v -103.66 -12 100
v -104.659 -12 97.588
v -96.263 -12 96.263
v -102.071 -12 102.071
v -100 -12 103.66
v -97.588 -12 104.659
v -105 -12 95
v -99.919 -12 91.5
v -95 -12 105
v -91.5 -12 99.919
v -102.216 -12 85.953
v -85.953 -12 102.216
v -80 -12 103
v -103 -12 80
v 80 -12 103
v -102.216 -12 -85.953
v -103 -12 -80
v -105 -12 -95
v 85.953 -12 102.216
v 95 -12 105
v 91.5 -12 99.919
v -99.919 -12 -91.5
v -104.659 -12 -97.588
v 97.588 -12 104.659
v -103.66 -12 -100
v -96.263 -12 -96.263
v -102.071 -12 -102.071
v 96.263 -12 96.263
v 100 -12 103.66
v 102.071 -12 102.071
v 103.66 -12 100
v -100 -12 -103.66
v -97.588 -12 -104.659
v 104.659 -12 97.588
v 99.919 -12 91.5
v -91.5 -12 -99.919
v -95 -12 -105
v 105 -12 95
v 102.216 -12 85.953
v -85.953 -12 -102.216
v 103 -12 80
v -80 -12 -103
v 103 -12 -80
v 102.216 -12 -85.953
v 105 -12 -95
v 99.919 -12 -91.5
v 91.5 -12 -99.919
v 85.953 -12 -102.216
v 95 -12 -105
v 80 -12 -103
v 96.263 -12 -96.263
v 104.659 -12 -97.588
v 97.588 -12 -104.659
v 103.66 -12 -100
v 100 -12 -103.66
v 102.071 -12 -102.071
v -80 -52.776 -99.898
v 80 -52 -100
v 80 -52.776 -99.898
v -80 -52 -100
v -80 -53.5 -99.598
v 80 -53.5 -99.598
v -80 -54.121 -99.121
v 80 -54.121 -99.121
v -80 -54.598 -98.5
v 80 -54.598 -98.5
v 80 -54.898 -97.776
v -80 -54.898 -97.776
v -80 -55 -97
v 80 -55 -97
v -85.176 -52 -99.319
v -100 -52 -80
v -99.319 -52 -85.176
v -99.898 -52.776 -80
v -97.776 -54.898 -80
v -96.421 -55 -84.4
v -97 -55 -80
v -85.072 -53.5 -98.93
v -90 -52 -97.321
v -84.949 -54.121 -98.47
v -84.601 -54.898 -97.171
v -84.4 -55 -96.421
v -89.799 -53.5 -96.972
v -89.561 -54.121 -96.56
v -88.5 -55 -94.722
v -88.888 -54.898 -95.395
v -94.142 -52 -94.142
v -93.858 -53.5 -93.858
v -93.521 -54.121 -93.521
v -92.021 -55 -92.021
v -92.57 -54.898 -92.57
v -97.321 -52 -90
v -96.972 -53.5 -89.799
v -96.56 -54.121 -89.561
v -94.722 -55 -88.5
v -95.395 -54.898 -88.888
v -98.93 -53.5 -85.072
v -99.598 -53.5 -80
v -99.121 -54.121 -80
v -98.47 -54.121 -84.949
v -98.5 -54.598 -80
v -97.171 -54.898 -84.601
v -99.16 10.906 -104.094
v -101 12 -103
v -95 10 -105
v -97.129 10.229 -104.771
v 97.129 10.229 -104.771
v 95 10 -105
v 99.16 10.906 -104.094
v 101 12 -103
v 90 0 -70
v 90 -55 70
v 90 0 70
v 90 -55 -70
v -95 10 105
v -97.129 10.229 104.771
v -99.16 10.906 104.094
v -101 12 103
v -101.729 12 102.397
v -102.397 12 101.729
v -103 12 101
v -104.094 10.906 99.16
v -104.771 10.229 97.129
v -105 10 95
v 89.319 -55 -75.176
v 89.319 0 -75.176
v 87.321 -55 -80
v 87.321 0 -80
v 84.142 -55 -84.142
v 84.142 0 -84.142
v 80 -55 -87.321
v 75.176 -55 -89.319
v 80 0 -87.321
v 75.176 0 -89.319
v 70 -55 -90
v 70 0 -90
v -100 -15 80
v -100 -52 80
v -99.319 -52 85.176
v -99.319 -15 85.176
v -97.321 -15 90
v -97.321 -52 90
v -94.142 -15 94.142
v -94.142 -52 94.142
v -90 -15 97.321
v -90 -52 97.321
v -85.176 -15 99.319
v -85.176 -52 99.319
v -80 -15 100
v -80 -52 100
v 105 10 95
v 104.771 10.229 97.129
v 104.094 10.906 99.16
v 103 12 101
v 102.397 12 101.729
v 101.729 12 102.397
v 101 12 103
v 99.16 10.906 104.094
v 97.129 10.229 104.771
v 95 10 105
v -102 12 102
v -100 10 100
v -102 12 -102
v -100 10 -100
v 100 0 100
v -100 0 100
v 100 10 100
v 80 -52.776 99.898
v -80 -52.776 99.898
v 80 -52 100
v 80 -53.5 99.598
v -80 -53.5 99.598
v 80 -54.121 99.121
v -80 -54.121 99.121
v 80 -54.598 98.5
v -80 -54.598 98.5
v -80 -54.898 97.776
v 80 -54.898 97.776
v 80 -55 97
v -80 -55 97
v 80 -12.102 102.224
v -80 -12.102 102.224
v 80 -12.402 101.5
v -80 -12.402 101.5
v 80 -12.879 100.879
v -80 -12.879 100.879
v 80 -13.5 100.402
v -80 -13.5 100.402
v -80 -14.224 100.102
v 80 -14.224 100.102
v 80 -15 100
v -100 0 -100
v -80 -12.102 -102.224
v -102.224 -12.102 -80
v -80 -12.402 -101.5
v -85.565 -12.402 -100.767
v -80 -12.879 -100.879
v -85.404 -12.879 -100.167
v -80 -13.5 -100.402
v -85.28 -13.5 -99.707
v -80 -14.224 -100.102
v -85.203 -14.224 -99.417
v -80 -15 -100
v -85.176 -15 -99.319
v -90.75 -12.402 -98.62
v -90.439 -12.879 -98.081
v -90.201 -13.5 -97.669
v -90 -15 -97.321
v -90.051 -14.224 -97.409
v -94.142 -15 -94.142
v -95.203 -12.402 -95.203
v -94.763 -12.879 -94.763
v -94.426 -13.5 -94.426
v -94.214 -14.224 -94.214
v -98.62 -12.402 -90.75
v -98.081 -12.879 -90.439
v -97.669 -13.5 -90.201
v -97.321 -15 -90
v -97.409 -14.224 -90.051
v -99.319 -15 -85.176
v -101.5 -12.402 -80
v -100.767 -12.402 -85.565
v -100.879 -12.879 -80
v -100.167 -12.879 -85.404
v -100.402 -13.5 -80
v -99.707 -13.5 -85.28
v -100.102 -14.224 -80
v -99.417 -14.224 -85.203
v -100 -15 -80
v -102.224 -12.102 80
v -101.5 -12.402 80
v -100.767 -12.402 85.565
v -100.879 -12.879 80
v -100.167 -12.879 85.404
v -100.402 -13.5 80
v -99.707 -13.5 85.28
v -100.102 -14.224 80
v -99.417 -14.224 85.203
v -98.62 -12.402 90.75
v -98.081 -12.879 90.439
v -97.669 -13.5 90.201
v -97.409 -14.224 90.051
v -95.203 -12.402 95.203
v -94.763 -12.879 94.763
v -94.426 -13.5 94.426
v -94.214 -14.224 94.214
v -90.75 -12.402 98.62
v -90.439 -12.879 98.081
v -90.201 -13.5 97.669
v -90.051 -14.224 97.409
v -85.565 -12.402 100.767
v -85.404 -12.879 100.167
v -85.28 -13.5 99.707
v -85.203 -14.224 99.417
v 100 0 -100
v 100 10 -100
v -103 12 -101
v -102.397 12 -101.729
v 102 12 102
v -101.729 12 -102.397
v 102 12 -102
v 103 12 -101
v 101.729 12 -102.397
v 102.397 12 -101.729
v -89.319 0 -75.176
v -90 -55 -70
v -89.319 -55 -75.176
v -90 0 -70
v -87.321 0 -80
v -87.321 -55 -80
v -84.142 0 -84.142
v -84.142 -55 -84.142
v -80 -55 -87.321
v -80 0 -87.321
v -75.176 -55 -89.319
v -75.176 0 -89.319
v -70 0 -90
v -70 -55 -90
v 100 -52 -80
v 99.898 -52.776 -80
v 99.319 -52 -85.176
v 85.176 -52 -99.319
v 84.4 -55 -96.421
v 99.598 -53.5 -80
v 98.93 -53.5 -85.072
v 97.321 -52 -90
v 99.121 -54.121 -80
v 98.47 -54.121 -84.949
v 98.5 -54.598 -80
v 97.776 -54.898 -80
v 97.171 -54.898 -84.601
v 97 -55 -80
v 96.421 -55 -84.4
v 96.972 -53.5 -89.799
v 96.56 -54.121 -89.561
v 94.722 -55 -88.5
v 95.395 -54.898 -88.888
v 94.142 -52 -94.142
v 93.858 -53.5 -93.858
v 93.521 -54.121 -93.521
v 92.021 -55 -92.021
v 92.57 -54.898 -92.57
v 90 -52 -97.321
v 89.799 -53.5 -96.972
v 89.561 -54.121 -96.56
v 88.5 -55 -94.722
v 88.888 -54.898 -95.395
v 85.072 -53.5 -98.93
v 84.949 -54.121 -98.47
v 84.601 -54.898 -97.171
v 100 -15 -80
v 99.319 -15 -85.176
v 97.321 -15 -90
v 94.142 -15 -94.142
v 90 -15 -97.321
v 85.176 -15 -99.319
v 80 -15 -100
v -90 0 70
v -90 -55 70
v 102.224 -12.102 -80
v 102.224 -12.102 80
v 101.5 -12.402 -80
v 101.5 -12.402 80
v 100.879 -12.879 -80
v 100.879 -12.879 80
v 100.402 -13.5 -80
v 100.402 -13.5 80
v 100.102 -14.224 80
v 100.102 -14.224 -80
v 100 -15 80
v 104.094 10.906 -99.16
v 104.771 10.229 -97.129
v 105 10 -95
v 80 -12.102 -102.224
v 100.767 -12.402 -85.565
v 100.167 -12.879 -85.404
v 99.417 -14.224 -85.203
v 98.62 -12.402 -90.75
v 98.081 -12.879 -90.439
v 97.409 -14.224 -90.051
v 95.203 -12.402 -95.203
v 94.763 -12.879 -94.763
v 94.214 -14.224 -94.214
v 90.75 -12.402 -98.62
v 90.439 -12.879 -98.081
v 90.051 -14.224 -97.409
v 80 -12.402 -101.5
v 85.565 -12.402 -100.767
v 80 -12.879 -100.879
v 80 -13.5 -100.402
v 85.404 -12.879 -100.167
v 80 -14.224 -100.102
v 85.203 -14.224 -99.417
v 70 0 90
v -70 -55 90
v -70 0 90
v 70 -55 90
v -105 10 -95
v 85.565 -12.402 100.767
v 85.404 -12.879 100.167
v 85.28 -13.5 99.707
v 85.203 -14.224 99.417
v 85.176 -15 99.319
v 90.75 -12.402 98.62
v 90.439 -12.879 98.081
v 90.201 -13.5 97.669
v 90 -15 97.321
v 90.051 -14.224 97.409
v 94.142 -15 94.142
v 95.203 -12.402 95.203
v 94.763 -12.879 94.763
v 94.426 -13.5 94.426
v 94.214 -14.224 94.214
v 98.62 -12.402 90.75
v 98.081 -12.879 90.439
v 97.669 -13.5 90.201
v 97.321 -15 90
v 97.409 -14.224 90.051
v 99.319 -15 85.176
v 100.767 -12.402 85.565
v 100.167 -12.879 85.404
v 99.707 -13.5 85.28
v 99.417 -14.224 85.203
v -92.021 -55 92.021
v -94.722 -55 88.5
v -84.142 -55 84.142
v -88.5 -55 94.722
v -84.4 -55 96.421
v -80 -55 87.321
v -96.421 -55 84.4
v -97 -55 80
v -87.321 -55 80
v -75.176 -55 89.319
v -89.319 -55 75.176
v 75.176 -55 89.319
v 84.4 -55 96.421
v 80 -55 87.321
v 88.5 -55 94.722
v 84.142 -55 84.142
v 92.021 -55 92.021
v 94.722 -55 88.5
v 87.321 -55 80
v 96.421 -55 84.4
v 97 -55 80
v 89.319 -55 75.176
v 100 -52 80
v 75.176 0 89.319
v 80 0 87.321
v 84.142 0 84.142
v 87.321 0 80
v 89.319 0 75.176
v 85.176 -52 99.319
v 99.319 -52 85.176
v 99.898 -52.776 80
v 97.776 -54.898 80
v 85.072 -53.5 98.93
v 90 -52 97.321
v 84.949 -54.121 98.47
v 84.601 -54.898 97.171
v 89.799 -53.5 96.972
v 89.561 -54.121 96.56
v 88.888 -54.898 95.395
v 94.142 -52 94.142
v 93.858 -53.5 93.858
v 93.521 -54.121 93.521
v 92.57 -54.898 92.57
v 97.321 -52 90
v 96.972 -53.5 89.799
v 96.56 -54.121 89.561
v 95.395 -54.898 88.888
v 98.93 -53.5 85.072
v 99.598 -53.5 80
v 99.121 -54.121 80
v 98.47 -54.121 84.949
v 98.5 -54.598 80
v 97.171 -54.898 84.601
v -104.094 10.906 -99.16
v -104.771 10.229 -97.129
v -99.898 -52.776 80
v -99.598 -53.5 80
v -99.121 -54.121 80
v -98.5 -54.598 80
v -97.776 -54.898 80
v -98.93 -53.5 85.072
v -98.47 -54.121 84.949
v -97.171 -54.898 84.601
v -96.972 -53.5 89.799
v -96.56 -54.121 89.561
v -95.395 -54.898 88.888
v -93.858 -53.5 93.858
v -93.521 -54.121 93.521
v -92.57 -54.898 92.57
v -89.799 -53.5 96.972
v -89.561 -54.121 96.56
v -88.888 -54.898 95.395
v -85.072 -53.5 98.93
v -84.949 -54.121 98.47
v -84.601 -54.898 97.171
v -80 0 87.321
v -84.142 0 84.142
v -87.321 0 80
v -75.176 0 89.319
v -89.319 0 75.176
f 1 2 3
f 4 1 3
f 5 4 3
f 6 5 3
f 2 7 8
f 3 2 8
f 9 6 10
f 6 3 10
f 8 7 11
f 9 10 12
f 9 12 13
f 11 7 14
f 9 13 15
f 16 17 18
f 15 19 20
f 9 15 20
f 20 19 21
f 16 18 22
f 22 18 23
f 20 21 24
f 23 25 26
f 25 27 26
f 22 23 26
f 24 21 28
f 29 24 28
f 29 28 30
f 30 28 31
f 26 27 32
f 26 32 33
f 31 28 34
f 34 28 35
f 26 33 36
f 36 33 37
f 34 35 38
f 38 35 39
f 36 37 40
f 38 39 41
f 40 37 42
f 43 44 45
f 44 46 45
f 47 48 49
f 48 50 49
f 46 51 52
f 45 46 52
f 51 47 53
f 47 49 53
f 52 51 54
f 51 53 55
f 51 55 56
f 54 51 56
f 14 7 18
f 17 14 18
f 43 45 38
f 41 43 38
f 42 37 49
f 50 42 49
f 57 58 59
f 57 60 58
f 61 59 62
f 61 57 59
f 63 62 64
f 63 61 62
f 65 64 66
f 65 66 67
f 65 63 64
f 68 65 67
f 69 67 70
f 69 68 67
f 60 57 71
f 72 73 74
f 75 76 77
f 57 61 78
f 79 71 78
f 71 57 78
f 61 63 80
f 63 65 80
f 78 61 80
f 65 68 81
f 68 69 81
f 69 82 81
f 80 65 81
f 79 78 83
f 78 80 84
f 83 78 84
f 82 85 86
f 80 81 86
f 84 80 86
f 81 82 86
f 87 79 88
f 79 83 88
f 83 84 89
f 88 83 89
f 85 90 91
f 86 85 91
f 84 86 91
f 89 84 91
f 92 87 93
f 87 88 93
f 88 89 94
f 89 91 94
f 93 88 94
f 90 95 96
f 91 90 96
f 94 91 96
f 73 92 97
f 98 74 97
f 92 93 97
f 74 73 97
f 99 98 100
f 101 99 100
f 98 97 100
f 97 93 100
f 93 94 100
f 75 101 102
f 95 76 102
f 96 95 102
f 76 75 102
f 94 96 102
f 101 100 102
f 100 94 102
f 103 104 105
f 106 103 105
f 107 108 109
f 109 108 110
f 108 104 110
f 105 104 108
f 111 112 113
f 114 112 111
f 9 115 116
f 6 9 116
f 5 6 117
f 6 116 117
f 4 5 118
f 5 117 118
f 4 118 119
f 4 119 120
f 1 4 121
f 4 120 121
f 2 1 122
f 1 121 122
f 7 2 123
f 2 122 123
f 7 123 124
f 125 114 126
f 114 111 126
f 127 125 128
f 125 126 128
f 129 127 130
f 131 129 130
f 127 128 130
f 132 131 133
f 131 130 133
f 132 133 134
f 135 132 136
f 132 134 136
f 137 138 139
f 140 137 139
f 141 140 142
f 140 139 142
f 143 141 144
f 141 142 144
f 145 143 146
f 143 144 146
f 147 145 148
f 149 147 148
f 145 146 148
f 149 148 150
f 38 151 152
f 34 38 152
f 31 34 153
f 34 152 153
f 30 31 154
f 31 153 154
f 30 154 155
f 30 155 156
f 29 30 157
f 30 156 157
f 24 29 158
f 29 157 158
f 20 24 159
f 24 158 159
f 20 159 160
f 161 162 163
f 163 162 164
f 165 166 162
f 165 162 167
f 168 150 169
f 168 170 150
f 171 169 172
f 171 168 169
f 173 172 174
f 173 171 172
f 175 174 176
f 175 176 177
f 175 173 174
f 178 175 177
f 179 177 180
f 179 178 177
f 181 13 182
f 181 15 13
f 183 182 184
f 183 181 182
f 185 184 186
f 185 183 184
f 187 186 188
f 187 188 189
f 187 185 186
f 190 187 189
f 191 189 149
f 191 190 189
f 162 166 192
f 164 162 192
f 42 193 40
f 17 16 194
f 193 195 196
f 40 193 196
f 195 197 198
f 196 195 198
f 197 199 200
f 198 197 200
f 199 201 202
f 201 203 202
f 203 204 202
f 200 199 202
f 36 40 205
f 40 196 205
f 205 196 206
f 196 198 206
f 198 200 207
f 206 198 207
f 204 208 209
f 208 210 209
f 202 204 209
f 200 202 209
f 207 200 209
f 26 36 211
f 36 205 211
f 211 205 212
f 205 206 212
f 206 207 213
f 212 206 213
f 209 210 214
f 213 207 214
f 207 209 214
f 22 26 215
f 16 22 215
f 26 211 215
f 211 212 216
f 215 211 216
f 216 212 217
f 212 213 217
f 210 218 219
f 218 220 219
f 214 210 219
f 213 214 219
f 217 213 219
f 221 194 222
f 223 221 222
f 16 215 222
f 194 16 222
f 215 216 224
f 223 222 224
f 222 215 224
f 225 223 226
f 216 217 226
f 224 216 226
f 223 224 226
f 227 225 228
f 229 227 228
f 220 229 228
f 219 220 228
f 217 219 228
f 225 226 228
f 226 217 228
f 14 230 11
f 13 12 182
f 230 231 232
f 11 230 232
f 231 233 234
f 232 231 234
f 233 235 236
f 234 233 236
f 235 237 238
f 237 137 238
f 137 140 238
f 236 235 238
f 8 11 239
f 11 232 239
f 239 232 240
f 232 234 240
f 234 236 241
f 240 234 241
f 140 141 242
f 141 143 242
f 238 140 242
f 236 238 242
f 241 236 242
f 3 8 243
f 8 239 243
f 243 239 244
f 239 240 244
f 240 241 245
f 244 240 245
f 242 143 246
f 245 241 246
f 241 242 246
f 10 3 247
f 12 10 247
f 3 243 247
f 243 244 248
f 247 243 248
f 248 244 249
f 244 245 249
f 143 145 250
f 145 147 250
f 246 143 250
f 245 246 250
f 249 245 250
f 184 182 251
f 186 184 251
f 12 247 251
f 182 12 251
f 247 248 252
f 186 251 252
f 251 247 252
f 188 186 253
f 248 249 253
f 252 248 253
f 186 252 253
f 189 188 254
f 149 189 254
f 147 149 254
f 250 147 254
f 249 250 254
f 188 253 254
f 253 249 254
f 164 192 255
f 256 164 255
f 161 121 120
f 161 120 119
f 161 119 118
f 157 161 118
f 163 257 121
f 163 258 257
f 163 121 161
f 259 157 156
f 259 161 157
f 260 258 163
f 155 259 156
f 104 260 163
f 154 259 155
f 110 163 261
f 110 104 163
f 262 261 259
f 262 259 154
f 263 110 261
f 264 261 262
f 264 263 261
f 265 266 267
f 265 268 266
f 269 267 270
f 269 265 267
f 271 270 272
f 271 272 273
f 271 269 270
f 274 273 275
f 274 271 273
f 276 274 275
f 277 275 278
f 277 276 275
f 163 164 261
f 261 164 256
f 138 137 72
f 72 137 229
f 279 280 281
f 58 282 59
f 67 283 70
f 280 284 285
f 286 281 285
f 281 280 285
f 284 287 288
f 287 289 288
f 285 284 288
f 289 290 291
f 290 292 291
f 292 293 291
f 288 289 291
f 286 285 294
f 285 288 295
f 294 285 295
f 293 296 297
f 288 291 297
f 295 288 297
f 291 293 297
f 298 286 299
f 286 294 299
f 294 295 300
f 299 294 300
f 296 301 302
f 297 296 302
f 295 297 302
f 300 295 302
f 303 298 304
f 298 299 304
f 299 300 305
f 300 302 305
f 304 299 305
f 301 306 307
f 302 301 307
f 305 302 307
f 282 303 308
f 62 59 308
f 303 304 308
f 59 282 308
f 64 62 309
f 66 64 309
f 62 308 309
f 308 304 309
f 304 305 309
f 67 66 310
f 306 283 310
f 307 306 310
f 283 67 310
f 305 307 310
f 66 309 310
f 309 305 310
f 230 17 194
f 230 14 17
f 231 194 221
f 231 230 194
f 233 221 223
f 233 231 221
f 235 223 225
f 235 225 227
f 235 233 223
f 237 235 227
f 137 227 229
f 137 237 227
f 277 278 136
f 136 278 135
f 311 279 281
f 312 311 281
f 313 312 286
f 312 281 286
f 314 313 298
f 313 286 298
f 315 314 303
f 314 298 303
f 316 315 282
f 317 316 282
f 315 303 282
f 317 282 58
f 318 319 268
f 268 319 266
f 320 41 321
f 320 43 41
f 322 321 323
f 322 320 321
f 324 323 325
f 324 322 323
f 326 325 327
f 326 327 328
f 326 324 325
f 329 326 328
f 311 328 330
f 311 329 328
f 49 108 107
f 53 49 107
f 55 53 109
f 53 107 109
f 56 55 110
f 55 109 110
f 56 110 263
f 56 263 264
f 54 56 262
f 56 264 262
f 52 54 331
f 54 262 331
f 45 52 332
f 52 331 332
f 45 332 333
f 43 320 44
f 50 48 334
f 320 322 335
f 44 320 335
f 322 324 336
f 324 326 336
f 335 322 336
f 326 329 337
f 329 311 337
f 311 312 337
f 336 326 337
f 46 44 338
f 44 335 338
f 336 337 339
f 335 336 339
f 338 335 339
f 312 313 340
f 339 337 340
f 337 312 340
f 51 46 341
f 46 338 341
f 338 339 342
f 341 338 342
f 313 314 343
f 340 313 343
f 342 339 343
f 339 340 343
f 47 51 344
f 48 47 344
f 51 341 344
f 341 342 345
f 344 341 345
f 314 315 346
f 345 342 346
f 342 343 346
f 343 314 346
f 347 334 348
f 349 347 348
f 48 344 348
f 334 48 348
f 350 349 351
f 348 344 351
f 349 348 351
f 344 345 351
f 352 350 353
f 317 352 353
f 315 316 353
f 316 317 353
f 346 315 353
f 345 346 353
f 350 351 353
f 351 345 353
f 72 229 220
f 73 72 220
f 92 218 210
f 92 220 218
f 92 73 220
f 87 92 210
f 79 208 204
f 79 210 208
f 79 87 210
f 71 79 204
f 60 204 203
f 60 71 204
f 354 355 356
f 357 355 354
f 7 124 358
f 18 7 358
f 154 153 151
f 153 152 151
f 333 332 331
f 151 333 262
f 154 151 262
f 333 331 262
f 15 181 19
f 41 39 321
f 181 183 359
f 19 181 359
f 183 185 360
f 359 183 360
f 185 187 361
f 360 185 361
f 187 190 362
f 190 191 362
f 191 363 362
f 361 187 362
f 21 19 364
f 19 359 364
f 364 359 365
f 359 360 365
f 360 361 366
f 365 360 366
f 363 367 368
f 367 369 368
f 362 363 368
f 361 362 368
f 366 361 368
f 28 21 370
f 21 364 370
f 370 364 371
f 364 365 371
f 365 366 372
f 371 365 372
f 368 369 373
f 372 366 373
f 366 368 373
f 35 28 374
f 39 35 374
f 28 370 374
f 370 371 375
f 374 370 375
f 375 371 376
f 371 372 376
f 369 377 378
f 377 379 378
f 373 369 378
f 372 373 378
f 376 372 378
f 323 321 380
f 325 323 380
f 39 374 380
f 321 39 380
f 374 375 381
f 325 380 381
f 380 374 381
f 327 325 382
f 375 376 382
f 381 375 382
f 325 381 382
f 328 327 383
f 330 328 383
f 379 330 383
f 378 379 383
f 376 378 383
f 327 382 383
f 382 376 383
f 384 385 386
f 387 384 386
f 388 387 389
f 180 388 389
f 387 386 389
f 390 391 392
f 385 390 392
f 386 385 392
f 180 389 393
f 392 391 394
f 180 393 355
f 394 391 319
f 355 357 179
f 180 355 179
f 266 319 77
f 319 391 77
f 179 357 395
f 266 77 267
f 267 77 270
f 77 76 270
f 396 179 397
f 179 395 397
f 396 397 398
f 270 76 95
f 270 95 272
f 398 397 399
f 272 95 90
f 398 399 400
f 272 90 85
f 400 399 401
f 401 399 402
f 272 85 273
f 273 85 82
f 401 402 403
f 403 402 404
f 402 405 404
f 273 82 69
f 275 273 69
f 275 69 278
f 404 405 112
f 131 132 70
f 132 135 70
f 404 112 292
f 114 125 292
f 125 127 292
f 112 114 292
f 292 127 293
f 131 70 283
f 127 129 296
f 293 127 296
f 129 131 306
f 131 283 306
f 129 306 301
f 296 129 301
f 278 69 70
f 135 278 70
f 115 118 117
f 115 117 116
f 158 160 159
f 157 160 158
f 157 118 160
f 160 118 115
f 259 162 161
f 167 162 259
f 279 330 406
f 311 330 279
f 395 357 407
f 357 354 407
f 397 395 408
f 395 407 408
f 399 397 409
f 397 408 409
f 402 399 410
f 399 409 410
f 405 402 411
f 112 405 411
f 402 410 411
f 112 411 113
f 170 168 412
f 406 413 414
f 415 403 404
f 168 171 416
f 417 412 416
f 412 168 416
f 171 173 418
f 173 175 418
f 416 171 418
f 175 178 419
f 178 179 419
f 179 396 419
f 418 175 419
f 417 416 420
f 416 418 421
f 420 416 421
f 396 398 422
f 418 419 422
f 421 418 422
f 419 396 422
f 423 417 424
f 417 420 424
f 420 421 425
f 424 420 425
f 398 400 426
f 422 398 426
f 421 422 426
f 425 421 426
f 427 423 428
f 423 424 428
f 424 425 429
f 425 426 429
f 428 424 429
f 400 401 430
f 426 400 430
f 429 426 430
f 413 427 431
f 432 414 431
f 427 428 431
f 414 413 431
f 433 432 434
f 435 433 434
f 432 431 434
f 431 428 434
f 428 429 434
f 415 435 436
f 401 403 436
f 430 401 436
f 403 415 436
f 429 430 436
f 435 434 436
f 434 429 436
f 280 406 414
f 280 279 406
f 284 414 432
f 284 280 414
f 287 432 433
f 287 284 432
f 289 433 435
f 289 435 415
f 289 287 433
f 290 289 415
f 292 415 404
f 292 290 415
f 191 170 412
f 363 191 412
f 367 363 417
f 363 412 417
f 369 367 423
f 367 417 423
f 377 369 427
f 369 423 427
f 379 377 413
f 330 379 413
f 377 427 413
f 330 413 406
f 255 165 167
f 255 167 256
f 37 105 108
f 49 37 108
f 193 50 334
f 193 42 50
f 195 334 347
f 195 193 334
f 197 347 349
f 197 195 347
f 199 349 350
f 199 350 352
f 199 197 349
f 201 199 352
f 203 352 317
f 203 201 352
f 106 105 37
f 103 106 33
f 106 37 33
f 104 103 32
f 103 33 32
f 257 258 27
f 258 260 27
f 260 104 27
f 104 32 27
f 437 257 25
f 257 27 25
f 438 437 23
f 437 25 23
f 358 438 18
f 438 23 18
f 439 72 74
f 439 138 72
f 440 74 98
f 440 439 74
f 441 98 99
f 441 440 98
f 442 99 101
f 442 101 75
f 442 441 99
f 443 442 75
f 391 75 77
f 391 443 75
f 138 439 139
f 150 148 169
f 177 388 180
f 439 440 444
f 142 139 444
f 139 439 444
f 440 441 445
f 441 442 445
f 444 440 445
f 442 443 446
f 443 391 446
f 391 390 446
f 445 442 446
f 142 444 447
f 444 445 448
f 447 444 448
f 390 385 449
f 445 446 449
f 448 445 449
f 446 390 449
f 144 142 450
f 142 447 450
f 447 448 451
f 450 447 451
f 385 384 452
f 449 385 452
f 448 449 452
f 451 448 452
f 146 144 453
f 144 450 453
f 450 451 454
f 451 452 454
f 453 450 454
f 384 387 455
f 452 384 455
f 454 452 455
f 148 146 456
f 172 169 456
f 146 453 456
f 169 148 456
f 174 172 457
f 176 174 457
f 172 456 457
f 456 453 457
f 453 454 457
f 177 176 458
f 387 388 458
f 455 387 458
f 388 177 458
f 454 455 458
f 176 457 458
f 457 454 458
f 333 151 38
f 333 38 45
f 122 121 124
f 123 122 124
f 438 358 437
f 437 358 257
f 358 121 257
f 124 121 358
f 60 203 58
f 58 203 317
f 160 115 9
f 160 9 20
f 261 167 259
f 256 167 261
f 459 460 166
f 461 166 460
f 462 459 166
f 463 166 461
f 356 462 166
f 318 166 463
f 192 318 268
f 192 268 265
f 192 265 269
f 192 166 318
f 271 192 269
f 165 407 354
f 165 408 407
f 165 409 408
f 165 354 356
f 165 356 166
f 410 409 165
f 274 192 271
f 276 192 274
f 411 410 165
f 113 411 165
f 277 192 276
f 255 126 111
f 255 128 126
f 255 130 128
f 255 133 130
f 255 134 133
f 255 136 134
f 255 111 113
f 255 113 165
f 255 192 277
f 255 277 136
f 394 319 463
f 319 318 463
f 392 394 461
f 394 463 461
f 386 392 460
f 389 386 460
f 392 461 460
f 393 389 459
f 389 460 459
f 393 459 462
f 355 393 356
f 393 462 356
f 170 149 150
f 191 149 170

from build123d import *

# Parameters (mm, degrees)
SKETCH1_W               = 200
SKETCH1_H               = 200
BOSS_EXTRUDE1_DEPTH     = 55
FILLET1_R               = 20
SKETCH2_W               = 210
SKETCH2_H               = 210
SKETCH2_W_2             = 200
SKETCH2_H_2             = 200
BOSS_EXTRUDE2_DEPTH     = 12
SKETCH3_W               = 210
SKETCH3_H               = 210
BOSS_EXTRUDE3_DEPTH     = 12
CUT_EXTRUDE1_DEPTH      = 159.350876221
CUT_EXTRUDE1_DEPTH_BACK = 159.350876221
SKETCH5_W               = 180
SKETCH5_H               = 180
CHAMFER1_SIZE           = 2
FILLET2_R               = 10
FILLET3_R               = 3
FILLET4_R               = 20


with BuildPart() as part:
    # Sketch1 → Boss-Extrude1 (new body)
    with BuildSketch(Plane(origin=(0, 0, 0), x_dir=(1, 0, 0), z_dir=(0, 1, 0))):
        Rectangle(SKETCH1_W, SKETCH1_H)
    extrude(amount=-BOSS_EXTRUDE1_DEPTH)

    # Fillet1
    fillet1_edges = [part.edges().sort_by_distance(p)[0] for p in [
        (100, -27.5, 100),
        (-100, -27.5, 100),
        (-100, -27.5, -100),
        (100, -27.5, -100),
    ]]
    fillet(fillet1_edges, radius=FILLET1_R)

    # Sketch3 → Boss-Extrude3 (add)
    with BuildSketch(Plane(origin=(0, 0, 0), x_dir=(1, 0, 0), z_dir=(0, 1, 0))):
        Rectangle(SKETCH3_W, SKETCH3_H)
    extrude(amount=-BOSS_EXTRUDE3_DEPTH)


with BuildPart() as body_2:
    # Sketch2 → Boss-Extrude2 (new body)
    with BuildSketch(Plane(origin=(0, 0, 0), x_dir=(1, 0, 0), z_dir=(0, 1, 0))):
        Rectangle(SKETCH2_W, SKETCH2_H)
        Rectangle(SKETCH2_W_2, SKETCH2_H_2, mode=Mode.SUBTRACT)
    extrude(amount=BOSS_EXTRUDE2_DEPTH)

    # Combine2: union part
    add(part.part)

    # Sketch5 → Cut-Extrude1 (cut, two sides: drawn at the far end of the back side and taken through both)
    with BuildSketch(Plane(origin=(0, 0, 0), x_dir=(1, 0, 0), z_dir=(0, 1, 0)).offset(-CUT_EXTRUDE1_DEPTH_BACK)):
        Rectangle(SKETCH5_W, SKETCH5_H)
    extrude(amount=CUT_EXTRUDE1_DEPTH + CUT_EXTRUDE1_DEPTH_BACK, mode=Mode.SUBTRACT)

    # Chamfer1
    chamfer1_edges = [body_2.edges().sort_by_distance(p)[0] for p in [
        (-105, 12, 0),
        (100, 12, 0),
        (0, 12, 105),
        (0, 12, -100),
        (-100, 12, 0),
        (0, 12, 100),
        (105, 12, 0),
        (0, 12, -105),
    ]]
    chamfer(chamfer1_edges, length=CHAMFER1_SIZE)

    # Fillet2
    # the kernel refuses this fillet: 10 mm, written as the material it takes off along each edge
    with BuildSketch(Plane(origin=(105, 35, 105), x_dir=(-1, 0, 0), z_dir=(0, -1, 0)), Plane(origin=(-105, 35, 105), x_dir=(0, 0, -1), z_dir=(0, -1, 0)), Plane(origin=(-105, -37, -105), x_dir=(0, 0, 1), z_dir=(0, 1, 0))) as fillet2_piece_1:
        with BuildLine():
            CenterArc((FILLET2_R, FILLET2_R), FILLET2_R, 180, 90)
            Line((0, FILLET2_R), (0, 0))
            Line((0, 0), (FILLET2_R, 0))
        make_face()
    extrude(amount=72, mode=Mode.SUBTRACT)
    with BuildSketch(Plane(origin=(105, 35, -105), x_dir=(-1, 0, 0), z_dir=(0, -1, 0))) as fillet2_piece_2:
        with BuildLine():
            CenterArc((FILLET2_R, -FILLET2_R), FILLET2_R, 90, 90)
            Line((0, -FILLET2_R), (0, 0))
            Line((0, 0), (FILLET2_R, 0))
        make_face()
    extrude(amount=72, mode=Mode.SUBTRACT)

    # Fillet3
    fillet3_edges = [body_2.edges().sort_by_distance(p)[0] for p in [
        (100, -55, 0),
        (0, -55, 100),
        (-100, -55, 0),
        (0, -55, -100),
        (94.142135624, -55, -94.142135624),
        (94.142135624, -55, 94.142135624),
        (-94.142135624, -55, 94.142135624),
        (-94.142135624, -55, -94.142135624),
        (0, -12, -100),
        (-94.142135624, -12, -94.142135624),
        (-100, -12, 0),
        (-94.142135624, -12, 94.142135624),
        (0, -12, 100),
        (94.142135624, -12, 94.142135624),
        (100, -12, 0),
        (94.142135624, -12, -94.142135624),
    ]]
    fillet(fillet3_edges, radius=FILLET3_R)

    # Fillet4
    fillet4_edges = [body_2.edges().sort_by_distance(p)[0] for p in [
        (90, -27.5, -90),
        (90, -27.5, 90),
        (-90, -27.5, 90),
        (-90, -27.5, -90),
    ]]
    fillet(fillet4_edges, radius=FILLET4_R)


solid = body_2.part
